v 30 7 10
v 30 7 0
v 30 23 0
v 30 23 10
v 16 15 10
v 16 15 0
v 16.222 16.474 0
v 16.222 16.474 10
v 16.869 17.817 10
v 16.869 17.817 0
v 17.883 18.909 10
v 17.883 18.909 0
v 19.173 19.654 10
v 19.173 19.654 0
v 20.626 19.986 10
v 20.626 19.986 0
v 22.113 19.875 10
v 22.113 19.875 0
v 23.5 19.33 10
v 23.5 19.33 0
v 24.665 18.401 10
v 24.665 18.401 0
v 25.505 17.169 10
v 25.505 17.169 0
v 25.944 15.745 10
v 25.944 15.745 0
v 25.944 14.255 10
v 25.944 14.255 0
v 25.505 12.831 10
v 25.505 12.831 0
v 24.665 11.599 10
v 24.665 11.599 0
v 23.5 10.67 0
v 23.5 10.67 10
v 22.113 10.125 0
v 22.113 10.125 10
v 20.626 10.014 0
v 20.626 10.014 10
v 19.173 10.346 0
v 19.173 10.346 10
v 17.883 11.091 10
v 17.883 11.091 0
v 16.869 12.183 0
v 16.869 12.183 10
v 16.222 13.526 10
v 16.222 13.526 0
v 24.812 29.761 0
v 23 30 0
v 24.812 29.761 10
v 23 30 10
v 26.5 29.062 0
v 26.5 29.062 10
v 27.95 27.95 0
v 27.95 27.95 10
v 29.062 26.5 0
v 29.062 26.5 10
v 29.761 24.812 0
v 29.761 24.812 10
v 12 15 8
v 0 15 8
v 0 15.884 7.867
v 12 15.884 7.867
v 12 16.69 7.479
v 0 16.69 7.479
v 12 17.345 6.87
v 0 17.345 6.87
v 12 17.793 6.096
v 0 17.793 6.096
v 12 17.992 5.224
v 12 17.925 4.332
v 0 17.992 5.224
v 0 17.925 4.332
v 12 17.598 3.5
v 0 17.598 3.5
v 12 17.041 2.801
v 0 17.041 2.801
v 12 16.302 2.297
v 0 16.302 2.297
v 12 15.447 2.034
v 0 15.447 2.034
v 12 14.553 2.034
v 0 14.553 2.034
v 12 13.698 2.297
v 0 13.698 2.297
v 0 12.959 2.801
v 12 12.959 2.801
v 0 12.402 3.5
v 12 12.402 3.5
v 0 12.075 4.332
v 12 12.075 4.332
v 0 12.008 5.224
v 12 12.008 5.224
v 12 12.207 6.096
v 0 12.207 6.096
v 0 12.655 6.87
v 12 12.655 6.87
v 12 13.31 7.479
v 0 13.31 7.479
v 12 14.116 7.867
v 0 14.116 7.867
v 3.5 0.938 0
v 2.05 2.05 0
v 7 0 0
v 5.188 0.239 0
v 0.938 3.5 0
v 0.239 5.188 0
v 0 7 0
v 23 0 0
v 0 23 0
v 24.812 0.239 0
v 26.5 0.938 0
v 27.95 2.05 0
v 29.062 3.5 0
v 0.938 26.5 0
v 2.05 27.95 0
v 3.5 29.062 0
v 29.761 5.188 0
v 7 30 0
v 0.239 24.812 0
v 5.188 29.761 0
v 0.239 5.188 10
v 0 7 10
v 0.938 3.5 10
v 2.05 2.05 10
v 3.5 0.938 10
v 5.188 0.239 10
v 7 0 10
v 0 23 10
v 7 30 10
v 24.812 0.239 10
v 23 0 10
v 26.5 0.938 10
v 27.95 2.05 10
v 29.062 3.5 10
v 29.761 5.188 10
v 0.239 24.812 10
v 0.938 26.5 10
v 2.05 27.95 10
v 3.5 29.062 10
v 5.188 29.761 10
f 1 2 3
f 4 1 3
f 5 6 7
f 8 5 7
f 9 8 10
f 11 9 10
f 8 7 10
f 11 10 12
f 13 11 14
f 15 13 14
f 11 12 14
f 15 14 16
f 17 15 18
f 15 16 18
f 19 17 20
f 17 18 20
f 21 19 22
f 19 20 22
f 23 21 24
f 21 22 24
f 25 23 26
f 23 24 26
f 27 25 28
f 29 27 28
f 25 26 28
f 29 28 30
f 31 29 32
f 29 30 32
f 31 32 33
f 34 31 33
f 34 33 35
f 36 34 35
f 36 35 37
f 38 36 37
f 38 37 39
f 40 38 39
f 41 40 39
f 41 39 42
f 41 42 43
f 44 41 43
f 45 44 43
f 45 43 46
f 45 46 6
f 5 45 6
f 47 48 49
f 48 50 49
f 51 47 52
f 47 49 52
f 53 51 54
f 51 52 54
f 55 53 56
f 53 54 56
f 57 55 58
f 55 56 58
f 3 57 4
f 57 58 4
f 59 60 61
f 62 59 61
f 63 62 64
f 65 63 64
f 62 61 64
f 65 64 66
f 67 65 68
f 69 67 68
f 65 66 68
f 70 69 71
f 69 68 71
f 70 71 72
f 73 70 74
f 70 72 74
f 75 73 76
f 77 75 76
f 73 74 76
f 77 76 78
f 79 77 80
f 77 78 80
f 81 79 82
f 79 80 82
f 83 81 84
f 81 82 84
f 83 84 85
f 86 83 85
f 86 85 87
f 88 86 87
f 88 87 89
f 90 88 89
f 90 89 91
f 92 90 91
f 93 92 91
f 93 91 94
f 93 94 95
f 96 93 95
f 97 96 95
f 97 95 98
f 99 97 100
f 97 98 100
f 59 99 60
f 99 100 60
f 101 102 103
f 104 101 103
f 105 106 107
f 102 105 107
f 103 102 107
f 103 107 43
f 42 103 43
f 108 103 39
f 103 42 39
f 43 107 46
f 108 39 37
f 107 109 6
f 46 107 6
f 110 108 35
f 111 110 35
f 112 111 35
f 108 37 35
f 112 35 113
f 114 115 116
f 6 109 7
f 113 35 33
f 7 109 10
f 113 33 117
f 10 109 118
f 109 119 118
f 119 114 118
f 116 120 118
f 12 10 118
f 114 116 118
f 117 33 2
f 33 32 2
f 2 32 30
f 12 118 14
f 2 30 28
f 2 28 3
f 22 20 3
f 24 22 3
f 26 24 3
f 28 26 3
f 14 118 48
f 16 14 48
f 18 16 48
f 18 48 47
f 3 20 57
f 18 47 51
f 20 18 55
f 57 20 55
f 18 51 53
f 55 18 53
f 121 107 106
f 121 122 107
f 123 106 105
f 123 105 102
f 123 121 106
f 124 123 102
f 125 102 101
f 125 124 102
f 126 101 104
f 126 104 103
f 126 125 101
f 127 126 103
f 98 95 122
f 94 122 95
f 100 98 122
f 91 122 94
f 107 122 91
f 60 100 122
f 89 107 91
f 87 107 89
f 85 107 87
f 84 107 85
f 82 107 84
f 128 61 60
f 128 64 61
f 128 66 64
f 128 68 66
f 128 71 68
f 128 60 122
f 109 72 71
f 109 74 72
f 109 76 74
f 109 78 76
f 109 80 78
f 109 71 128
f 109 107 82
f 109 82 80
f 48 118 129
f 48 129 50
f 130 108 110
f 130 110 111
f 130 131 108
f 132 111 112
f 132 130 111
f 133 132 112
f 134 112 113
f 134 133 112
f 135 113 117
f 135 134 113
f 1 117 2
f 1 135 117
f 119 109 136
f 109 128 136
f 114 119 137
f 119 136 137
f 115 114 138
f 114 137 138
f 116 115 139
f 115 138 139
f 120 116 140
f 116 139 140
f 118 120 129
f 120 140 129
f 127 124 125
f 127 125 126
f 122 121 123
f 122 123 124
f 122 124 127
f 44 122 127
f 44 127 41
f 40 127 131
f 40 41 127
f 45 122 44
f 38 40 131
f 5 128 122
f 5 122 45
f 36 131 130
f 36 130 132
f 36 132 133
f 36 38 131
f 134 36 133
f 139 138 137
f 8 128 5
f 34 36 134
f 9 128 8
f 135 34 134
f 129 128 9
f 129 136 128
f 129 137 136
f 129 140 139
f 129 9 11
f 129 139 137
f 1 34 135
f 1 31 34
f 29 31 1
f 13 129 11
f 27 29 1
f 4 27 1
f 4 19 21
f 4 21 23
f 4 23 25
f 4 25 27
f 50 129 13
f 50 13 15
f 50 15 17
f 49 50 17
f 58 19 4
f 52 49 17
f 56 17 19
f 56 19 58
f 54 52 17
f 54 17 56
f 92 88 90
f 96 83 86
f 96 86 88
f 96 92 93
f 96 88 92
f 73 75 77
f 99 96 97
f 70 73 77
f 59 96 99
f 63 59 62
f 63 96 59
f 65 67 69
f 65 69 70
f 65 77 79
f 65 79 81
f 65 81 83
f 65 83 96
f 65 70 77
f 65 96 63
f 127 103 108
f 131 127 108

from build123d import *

# Parameters (mm, degrees)
SKETCH_1_W          = 30
SKETCH_1_H          = 30
EXTRUDE_1_DEPTH     = 10
CUT_EXTRUDE_1_REACH = 45.589
SKETCH_2_R          = 5
FILLET_1_R          = 7
SKETCH_3_R          = 3
CUT_EXTRUDE_2_DEPTH = 12


with BuildPart() as part:
    # 草图1 → 凸台-拉伸1 (new body)
    with BuildSketch(Plane.XY):
        with Locations((15, 15)):
            Rectangle(SKETCH_1_W, SKETCH_1_H)
    extrude(amount=EXTRUDE_1_DEPTH)

    # 草图2 → 切除-拉伸1 (cut, up to next)
    with BuildSketch(Plane(origin=(0, 0, 0), x_dir=(-1, 0, 0), z_dir=(0, 0, -1)), mode=Mode.PRIVATE) as cut_extrude_1_sk1:
        with Locations((-21, 15)):
            Circle(SKETCH_2_R)
    cut_extrude_1_tool1 = extrude(cut_extrude_1_sk1.sketch, amount=-CUT_EXTRUDE_1_REACH, mode=Mode.PRIVATE) & part.part
    add(cut_extrude_1_tool1.solids().sort_by_distance((21, 15, 0))[0], mode=Mode.SUBTRACT)

    # 圆角1
    fillet_1_edges = [part.edges().sort_by_distance(p)[0] for p in [
        (0, 30, 5),
        (30, 30, 5),
        (30, 0, 5),
        (0, 0, 5),
    ]]
    fillet(fillet_1_edges, radius=FILLET_1_R)

    # 草图3 → 切除-拉伸2 (cut)
    with BuildSketch(Plane.ZY):
        with Locations((5, 15)):
            Circle(SKETCH_3_R)
    extrude(amount=-CUT_EXTRUDE_2_DEPTH, mode=Mode.SUBTRACT)


solid = part.part
